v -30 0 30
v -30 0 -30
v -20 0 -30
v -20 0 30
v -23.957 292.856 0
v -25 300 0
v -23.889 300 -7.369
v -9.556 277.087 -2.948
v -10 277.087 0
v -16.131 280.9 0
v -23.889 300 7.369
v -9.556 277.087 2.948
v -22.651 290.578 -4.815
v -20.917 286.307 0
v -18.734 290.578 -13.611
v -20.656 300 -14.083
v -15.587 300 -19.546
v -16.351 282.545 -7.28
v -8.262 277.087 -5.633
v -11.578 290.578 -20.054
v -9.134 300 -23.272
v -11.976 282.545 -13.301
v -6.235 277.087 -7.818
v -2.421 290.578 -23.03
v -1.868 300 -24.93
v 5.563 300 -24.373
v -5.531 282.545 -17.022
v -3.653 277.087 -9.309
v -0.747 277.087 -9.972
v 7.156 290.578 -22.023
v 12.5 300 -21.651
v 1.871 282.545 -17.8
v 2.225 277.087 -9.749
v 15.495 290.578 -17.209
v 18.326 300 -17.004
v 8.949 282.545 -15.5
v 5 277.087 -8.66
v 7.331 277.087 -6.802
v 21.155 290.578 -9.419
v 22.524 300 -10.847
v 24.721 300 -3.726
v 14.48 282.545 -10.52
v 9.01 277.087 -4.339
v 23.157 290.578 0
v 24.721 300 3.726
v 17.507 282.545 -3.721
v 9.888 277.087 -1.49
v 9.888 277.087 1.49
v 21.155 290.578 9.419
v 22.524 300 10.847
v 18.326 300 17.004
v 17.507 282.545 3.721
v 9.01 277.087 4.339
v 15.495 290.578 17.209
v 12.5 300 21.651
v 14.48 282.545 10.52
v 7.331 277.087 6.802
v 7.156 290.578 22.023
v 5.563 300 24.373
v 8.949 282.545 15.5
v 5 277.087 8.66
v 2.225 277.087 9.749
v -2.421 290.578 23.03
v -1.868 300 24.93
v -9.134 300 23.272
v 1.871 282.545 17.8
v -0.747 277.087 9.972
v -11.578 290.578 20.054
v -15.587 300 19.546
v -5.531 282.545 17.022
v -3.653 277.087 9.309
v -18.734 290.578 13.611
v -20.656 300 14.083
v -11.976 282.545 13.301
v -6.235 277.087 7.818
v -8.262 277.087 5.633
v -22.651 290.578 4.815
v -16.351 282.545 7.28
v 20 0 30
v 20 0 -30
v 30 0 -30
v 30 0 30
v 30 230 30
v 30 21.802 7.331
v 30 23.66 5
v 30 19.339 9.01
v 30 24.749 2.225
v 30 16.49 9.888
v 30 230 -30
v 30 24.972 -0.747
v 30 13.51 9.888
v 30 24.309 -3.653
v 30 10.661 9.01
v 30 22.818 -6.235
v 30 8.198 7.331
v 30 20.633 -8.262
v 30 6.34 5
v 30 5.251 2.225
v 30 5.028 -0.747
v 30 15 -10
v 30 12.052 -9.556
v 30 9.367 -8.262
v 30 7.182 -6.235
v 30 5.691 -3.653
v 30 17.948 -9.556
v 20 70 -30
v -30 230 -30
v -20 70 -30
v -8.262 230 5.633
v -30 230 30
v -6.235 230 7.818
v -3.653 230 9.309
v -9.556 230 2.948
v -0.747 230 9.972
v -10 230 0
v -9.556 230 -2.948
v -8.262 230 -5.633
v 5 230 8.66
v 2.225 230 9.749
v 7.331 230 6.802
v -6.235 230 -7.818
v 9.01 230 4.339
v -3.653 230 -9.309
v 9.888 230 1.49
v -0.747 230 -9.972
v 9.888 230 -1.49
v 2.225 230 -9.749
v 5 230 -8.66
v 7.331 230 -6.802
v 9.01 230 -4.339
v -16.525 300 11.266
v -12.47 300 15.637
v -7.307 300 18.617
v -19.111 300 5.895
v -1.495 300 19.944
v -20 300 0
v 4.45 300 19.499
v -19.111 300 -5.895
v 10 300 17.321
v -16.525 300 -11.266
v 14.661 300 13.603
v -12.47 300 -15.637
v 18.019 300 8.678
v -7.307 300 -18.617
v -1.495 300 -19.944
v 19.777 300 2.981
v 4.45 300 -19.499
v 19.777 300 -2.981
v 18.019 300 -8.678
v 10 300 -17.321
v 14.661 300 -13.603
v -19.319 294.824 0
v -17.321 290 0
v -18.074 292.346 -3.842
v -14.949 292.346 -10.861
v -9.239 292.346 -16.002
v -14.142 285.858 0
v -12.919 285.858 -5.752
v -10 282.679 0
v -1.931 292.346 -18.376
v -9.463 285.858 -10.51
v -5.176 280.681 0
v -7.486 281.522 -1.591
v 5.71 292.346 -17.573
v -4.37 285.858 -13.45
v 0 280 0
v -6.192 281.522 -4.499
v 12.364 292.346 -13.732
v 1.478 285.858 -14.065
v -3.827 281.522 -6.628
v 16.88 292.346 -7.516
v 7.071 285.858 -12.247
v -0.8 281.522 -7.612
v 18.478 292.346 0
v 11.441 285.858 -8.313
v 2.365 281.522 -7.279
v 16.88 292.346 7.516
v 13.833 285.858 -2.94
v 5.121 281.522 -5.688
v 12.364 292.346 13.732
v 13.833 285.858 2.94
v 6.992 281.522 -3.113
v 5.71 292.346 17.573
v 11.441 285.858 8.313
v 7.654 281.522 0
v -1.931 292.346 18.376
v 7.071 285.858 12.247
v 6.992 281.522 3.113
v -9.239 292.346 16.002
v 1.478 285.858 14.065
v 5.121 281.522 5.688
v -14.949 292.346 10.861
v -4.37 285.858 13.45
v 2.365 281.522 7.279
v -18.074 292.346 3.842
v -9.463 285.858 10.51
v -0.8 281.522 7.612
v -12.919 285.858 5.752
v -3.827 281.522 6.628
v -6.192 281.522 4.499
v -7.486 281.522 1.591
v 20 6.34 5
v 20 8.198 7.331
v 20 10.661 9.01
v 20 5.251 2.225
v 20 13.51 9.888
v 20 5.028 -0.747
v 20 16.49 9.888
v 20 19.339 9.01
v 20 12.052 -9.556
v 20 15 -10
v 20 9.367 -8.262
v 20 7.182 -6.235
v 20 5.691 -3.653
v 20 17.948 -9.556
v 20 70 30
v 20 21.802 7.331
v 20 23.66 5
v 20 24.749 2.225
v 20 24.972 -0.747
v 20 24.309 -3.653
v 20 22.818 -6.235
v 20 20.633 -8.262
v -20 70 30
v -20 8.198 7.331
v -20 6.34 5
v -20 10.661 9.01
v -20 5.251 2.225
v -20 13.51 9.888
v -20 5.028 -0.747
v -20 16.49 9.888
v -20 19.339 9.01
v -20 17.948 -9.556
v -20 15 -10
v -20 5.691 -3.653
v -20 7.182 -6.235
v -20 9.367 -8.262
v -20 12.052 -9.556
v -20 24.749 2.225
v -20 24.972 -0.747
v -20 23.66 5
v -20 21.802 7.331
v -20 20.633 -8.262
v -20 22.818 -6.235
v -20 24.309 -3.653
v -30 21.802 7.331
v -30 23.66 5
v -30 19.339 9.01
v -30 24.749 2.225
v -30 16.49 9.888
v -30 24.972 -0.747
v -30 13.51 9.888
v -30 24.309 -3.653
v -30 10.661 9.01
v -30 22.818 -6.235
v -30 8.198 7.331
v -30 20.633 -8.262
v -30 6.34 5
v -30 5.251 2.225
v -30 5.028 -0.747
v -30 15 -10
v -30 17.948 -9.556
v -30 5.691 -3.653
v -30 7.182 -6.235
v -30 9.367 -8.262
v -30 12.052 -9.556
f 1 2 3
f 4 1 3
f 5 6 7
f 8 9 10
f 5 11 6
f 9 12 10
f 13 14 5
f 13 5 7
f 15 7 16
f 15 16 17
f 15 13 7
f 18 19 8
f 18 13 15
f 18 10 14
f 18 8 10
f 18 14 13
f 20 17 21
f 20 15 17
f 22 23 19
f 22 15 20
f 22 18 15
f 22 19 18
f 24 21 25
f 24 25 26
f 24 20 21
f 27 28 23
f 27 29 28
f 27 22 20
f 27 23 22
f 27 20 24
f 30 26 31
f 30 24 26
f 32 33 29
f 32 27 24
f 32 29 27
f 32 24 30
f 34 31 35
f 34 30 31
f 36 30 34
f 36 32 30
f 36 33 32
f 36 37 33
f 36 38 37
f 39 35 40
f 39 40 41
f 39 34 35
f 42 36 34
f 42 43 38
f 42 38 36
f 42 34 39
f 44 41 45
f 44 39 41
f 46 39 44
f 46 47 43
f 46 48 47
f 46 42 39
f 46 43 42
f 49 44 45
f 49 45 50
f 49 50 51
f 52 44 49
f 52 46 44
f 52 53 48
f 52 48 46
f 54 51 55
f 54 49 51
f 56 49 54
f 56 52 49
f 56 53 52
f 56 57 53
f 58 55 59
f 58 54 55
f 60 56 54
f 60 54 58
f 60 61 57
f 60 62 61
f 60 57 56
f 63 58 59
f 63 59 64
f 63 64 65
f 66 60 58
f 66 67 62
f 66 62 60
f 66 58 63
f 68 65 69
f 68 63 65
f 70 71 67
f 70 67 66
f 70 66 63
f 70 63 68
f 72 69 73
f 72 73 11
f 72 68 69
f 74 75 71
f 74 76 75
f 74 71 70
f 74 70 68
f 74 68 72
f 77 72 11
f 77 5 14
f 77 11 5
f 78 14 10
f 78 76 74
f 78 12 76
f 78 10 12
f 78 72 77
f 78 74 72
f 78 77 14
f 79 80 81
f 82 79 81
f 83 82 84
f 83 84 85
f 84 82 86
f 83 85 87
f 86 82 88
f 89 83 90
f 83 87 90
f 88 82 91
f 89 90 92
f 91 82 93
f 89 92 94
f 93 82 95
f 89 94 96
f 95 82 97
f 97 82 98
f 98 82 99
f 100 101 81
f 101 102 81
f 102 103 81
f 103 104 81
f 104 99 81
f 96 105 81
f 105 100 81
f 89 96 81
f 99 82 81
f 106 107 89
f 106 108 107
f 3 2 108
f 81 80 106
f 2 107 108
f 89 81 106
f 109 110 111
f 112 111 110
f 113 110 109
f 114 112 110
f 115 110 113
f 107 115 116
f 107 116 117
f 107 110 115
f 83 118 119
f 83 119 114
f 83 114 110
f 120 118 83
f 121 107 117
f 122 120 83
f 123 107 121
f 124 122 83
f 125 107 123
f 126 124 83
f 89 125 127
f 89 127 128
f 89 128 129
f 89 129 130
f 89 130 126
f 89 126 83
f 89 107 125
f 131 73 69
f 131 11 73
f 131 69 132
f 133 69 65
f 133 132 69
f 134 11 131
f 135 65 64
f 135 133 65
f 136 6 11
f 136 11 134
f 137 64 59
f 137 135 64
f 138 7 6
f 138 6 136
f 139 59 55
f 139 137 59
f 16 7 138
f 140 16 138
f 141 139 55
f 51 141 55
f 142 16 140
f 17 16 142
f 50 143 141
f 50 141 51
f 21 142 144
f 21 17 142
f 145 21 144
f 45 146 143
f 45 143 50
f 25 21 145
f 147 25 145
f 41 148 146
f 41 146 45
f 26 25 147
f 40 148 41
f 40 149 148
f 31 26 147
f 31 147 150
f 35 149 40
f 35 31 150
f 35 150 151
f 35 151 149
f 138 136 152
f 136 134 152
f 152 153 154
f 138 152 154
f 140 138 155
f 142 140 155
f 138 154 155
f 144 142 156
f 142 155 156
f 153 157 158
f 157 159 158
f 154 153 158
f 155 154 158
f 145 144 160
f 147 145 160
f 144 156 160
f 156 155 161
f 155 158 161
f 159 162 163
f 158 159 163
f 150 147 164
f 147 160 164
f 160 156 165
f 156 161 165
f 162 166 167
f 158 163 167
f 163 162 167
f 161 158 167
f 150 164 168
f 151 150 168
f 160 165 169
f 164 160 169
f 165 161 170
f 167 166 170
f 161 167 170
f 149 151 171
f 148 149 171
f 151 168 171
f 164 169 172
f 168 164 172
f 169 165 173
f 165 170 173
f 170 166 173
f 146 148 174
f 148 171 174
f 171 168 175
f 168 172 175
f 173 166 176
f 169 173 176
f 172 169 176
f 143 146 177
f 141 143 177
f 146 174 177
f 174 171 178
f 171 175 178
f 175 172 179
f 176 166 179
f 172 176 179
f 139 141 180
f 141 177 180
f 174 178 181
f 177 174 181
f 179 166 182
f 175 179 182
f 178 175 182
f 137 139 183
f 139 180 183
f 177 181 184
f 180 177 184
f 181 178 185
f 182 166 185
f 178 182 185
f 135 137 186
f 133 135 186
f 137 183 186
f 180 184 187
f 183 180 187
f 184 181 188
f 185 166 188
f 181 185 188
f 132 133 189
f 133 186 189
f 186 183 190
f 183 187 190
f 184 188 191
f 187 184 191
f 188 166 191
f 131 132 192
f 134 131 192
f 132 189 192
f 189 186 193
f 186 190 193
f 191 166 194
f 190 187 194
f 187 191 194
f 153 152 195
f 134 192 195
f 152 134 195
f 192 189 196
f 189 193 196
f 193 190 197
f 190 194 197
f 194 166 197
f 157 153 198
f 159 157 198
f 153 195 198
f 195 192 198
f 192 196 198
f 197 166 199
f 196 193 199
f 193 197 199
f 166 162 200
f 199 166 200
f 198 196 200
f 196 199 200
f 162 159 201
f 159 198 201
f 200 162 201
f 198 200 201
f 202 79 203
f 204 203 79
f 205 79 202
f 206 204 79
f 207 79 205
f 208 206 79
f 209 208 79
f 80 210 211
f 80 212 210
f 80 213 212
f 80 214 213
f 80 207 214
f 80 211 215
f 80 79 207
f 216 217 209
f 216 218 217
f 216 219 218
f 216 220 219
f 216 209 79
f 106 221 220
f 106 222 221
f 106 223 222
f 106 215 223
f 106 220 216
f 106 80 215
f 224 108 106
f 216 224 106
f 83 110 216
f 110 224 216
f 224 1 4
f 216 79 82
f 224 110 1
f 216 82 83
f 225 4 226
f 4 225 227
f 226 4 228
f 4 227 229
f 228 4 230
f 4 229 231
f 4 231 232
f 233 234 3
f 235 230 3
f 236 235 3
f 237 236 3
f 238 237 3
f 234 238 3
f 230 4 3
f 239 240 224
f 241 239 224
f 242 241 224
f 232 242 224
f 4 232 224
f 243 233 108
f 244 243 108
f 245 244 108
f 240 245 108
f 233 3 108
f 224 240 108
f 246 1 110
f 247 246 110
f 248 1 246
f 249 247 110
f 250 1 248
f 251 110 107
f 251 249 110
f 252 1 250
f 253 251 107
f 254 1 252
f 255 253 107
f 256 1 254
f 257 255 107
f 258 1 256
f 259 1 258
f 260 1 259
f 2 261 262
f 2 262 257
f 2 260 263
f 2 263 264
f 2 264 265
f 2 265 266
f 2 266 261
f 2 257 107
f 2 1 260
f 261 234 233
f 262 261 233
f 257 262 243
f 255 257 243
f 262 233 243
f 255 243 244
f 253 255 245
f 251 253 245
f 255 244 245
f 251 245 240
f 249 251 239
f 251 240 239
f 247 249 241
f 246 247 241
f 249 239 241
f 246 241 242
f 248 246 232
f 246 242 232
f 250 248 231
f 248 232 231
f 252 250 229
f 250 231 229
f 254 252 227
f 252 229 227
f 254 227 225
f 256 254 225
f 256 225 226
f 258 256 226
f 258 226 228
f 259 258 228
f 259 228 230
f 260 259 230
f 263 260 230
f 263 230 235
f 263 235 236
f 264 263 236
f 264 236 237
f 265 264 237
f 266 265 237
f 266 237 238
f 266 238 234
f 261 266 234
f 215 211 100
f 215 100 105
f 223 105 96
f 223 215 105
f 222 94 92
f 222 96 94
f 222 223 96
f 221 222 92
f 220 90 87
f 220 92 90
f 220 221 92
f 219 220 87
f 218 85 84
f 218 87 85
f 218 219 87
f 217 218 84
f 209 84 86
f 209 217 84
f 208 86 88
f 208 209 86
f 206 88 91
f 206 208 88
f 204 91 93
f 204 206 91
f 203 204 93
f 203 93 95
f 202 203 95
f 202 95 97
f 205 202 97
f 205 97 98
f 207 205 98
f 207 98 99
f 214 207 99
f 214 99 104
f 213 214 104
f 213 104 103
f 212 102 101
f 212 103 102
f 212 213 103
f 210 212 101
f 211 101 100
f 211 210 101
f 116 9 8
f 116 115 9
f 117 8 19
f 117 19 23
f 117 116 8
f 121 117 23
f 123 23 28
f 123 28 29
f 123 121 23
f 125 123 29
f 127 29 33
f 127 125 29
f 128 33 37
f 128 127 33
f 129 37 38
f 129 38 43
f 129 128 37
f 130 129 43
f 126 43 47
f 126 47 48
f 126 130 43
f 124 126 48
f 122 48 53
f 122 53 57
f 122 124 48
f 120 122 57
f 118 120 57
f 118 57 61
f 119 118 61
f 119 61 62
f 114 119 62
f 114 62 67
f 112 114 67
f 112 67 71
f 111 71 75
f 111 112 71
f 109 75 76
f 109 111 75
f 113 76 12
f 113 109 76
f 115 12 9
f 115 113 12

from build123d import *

# Parameters (mm, degrees)
CROQUIS1_W                 = 60
CROQUIS1_H                 = 60
SALIENTE_EXTRUIR1_DEPTH    = 300
CROQUIS2_W                 = 40
CROQUIS2_H                 = 70
CORTAR_EXTRUIR1_DEPTH      = 31
CORTAR_EXTRUIR1_DEPTH_BACK = 31
CROQUIS3_R                 = 10
CORTAR_EXTRUIR2_DEPTH      = 31
CORTAR_EXTRUIR2_DEPTH_BACK = 31


with BuildPart() as part:
    # Croquis1 → Saliente-Extruir1 (new body)
    with BuildSketch(Plane(origin=(0, 0, 0), x_dir=(1, 0, 0), z_dir=(0, 1, 0))):
        Rectangle(CROQUIS1_W, CROQUIS1_H)
    extrude(amount=SALIENTE_EXTRUIR1_DEPTH)

    # Croquis2 → Cortar-Extruir1 (cut, two sides)
    with BuildSketch(Plane.XY) as cortar_extruir1_sk:
        with Locations((0, 35)):
            Rectangle(CROQUIS2_W, CROQUIS2_H)
    extrude(amount=CORTAR_EXTRUIR1_DEPTH, mode=Mode.SUBTRACT)
    extrude(cortar_extruir1_sk.sketch, amount=-CORTAR_EXTRUIR1_DEPTH_BACK, mode=Mode.SUBTRACT)

    # Croquis3 → Cortar-Extruir2 (cut, two sides)
    with BuildSketch(Plane(origin=(0, 0, 0), x_dir=(0, 0, -1), z_dir=(1, 0, 0))) as cortar_extruir2_sk:
        with Locations((0, 15)):
            Circle(CROQUIS3_R)
    extrude(amount=CORTAR_EXTRUIR2_DEPTH, mode=Mode.SUBTRACT)
    extrude(cortar_extruir2_sk.sketch, amount=-CORTAR_EXTRUIR2_DEPTH_BACK, mode=Mode.SUBTRACT)

    # Croquis4 → Cortar-Revolución5 (revolve, cut)
    with BuildSketch(Plane.XY):
        with BuildLine():
            ThreePointArc((-25, 300), (-20.916500663, 286.306936062), (-10, 277.087121525))
            Line((-10, 277.087121525), (-10, 230))
            Line((-10, 230), (-30, 230))
            Line((-30, 230), (-59.400541748, 230))
            Line((-59.400541748, 230), (-59.400541748, 300))
            Line((-59.400541748, 300), (-25, 300))
        make_face()
        with BuildLine():
            Line((0, 300), (-20, 300))
            ThreePointArc((-20, 300), (-14.142135624, 285.857864376), (0, 280))
            Line((0, 280), (0, 300))
        make_face()
    revolve(axis=Axis((0, 300, 0), (0, -1, 0)), mode=Mode.SUBTRACT)


solid = part.part
